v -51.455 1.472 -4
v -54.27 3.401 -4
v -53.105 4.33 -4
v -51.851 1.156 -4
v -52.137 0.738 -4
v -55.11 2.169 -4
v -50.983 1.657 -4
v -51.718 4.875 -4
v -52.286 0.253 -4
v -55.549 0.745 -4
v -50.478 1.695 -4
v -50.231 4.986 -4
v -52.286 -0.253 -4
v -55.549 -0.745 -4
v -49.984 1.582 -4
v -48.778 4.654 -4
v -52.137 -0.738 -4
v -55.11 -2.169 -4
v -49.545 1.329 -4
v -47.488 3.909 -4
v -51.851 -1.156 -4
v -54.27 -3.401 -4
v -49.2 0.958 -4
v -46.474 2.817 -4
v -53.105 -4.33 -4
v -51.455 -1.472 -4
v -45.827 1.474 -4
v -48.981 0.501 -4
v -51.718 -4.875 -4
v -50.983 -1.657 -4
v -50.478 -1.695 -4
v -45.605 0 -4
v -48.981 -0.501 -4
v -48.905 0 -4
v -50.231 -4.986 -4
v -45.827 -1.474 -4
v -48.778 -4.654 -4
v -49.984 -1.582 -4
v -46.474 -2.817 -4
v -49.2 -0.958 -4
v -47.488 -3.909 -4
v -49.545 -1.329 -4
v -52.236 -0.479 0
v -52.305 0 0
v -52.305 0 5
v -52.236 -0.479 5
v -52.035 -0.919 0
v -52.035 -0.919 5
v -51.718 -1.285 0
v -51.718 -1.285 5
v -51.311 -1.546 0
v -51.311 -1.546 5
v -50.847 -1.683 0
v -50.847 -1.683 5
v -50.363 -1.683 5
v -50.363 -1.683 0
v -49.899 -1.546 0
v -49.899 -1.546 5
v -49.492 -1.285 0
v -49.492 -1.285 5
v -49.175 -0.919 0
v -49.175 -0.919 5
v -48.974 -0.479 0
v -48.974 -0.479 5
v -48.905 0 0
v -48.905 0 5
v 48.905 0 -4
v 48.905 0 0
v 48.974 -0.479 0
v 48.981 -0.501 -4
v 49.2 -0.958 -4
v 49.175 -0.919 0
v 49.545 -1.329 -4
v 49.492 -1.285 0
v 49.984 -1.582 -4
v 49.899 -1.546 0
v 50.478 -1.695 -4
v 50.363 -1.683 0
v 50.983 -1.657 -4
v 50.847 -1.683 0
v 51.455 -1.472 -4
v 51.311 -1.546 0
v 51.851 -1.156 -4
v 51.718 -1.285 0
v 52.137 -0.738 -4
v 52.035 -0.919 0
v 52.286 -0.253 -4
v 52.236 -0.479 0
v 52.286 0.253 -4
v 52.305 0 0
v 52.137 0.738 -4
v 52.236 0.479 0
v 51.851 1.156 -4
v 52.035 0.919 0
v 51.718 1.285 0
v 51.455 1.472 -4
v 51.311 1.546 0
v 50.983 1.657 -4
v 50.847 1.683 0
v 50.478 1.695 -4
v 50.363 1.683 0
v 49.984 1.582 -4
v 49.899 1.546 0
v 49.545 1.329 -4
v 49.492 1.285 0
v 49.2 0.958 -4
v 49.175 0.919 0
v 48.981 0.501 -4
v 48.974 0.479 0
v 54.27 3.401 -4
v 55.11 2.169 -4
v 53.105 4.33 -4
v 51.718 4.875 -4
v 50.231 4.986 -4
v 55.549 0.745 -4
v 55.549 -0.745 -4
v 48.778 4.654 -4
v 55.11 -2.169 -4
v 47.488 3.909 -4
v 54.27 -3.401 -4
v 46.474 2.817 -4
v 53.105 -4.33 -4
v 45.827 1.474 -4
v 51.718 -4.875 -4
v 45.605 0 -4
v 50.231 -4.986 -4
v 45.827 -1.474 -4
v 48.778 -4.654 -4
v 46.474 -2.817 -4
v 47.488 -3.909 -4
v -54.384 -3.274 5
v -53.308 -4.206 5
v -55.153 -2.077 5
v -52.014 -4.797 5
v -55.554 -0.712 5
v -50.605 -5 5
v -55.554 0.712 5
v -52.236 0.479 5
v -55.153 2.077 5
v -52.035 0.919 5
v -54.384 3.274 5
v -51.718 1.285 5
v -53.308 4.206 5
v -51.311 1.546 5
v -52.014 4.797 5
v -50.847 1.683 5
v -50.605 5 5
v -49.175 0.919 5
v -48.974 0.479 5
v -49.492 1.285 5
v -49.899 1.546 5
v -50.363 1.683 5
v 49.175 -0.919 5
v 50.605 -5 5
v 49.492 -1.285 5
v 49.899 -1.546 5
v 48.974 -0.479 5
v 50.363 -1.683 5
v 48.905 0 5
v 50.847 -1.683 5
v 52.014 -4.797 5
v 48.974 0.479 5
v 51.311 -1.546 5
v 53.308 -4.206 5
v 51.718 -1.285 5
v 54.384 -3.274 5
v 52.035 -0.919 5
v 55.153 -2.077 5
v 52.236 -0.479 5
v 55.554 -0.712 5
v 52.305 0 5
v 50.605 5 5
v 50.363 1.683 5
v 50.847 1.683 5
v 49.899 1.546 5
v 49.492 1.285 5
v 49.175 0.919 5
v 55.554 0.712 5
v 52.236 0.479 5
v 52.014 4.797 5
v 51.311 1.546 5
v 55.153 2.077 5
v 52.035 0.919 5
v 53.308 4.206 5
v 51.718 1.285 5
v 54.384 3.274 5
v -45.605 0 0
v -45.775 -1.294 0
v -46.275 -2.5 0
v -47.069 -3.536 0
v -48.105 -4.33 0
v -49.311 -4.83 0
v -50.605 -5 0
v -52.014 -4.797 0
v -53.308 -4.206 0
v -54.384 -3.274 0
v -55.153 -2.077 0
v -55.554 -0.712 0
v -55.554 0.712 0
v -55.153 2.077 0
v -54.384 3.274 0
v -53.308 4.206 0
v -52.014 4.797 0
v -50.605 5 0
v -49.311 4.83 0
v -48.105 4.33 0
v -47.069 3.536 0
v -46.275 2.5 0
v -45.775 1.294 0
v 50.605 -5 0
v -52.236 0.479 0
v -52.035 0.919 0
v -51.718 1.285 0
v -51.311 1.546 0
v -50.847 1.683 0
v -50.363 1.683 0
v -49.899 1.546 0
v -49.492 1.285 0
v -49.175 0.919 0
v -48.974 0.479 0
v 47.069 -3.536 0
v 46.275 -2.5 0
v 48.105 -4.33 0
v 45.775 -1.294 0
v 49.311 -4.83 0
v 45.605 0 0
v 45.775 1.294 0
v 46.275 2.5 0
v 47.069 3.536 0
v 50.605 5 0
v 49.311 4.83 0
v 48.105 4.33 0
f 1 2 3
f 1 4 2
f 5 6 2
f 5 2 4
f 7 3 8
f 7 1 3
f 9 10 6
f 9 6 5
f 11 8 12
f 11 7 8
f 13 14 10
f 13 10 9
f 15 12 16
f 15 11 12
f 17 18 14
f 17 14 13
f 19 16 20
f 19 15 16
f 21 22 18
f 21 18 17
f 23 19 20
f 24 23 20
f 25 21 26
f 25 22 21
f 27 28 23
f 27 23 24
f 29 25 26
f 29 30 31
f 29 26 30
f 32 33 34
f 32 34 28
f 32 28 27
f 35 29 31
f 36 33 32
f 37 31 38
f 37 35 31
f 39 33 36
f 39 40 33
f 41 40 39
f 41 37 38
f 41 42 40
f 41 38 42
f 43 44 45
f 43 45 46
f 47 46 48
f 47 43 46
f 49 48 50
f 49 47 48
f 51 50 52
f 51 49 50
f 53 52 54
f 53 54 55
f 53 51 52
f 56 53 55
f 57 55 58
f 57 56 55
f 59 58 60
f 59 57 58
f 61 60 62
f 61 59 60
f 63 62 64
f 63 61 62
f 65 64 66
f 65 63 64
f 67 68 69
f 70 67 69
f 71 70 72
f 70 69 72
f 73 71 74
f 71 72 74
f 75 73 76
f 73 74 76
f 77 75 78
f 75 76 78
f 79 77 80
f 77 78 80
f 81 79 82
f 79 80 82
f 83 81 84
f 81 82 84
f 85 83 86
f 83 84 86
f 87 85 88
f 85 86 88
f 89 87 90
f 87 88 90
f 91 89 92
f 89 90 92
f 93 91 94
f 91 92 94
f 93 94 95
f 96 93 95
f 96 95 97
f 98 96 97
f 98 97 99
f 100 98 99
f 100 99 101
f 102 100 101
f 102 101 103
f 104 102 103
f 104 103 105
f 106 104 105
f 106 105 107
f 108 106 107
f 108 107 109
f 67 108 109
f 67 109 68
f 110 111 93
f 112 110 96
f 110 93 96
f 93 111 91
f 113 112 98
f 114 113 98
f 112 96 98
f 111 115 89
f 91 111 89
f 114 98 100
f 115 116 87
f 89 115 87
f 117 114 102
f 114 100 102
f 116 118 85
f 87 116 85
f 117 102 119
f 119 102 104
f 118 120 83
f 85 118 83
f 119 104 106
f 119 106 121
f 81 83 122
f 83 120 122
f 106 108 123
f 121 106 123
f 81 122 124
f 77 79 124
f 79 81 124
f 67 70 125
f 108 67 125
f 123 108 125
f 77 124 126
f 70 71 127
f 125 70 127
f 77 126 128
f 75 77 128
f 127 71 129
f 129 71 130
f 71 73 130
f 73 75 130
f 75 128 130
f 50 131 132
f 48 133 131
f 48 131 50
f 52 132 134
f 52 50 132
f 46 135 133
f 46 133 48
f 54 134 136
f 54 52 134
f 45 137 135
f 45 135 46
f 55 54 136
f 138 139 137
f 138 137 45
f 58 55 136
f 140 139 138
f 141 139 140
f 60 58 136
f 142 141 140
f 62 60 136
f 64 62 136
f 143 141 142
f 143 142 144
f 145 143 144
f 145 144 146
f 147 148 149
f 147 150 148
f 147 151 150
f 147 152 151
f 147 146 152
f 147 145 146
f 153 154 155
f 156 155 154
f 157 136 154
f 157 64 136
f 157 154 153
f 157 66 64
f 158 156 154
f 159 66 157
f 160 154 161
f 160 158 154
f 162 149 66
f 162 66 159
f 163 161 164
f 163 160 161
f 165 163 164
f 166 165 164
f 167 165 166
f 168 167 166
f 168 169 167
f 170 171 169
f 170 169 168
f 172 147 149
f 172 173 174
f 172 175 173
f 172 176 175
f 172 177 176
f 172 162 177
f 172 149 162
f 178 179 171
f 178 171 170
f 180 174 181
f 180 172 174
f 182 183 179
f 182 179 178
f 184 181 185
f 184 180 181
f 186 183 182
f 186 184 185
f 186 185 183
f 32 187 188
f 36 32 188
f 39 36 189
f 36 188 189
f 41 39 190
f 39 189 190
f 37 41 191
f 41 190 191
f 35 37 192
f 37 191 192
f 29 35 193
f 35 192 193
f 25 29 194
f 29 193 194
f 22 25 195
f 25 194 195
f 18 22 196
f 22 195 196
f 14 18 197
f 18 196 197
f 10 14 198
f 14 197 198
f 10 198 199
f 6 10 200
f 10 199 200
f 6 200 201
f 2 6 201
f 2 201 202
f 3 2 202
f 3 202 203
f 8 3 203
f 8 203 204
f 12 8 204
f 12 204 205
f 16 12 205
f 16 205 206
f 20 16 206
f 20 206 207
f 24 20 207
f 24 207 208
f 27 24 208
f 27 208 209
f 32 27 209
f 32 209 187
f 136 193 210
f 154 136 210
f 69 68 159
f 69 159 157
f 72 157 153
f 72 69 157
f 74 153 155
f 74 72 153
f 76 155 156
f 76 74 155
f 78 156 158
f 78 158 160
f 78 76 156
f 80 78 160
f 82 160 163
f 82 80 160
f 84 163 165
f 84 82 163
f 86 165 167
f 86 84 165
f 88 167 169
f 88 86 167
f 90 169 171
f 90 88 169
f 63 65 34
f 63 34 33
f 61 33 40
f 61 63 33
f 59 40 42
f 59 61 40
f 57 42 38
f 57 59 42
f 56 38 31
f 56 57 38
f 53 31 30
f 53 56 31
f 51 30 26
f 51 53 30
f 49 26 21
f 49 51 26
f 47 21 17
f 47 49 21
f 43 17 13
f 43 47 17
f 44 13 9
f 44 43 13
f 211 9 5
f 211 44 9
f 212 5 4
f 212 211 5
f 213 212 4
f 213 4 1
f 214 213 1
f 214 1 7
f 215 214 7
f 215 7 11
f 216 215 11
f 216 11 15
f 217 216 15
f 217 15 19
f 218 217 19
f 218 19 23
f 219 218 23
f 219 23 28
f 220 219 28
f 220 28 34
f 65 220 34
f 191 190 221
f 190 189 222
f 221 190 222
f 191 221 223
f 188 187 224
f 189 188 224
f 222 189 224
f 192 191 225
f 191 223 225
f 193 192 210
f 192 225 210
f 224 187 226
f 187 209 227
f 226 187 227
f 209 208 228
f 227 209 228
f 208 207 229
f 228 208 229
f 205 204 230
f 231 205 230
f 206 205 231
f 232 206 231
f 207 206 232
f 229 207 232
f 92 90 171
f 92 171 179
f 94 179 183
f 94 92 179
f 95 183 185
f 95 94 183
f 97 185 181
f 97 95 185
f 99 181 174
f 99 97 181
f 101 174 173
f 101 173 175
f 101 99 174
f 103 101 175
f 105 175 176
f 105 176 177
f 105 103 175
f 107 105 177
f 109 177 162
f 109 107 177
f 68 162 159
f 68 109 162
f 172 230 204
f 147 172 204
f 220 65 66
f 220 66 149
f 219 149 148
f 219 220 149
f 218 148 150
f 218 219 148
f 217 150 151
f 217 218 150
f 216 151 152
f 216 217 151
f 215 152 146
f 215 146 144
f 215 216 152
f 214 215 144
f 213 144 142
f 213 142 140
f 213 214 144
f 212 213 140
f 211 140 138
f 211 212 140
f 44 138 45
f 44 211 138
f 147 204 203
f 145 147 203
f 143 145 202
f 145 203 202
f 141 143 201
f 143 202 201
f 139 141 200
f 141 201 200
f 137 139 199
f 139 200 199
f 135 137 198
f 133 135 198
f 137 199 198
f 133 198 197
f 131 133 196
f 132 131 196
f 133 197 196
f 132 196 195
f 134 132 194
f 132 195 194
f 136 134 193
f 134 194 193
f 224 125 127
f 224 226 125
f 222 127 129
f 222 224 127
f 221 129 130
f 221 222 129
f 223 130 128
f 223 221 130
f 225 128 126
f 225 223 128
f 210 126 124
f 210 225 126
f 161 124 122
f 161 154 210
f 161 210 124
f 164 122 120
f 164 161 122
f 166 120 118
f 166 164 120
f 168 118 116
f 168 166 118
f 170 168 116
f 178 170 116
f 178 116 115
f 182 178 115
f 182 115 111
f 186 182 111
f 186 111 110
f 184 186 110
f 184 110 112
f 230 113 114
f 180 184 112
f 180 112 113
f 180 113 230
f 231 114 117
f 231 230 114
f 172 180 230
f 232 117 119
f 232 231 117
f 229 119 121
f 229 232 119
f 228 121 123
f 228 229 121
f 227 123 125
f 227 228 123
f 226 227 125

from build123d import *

# Parameters (mm, degrees)
F0_R     = 1.7
F1_DEPTH = 5
F2_R     = 5
F2_R_2   = 1.7
F3_DEPTH = 4


with BuildPart() as f1:
    # F0 (on Top) → F1 (new body)
    with BuildSketch(Plane.XY):
        with BuildLine():
            Line((-50.605015, -5), (50.605015, -5))
            ThreePointArc((50.605015, -5), (55.605015, 0), (50.605015, 5))
            Line((50.605015, 5), (-50.605015, 5))
            ThreePointArc((-50.605015, 5), (-55.605015, 0), (-50.605015, -5))
        make_face()
        with Locations((-50.605015, 0)):
            Circle(F0_R, mode=Mode.SUBTRACT)
        with Locations((50.605015, 0)):
            Circle(F0_R, mode=Mode.SUBTRACT)
    extrude(amount=F1_DEPTH)

    # F2 (on face) → F3 (join)
    with BuildSketch(Plane(origin=(0, 0, 0), x_dir=(1, 0, 0), z_dir=(0, 0, -1))):
        with Locations((-50.605015, 0)):
            Circle(F2_R)
        with Locations((-50.605015, 0)):
            Circle(F2_R_2, mode=Mode.SUBTRACT)
    extrude(amount=F3_DEPTH)

    # F4: F1 across plane


with BuildPart() as f1_1:
    add(f1.part)
    add(f1.part.mirror(Plane.YZ))


solid = f1_1.part
